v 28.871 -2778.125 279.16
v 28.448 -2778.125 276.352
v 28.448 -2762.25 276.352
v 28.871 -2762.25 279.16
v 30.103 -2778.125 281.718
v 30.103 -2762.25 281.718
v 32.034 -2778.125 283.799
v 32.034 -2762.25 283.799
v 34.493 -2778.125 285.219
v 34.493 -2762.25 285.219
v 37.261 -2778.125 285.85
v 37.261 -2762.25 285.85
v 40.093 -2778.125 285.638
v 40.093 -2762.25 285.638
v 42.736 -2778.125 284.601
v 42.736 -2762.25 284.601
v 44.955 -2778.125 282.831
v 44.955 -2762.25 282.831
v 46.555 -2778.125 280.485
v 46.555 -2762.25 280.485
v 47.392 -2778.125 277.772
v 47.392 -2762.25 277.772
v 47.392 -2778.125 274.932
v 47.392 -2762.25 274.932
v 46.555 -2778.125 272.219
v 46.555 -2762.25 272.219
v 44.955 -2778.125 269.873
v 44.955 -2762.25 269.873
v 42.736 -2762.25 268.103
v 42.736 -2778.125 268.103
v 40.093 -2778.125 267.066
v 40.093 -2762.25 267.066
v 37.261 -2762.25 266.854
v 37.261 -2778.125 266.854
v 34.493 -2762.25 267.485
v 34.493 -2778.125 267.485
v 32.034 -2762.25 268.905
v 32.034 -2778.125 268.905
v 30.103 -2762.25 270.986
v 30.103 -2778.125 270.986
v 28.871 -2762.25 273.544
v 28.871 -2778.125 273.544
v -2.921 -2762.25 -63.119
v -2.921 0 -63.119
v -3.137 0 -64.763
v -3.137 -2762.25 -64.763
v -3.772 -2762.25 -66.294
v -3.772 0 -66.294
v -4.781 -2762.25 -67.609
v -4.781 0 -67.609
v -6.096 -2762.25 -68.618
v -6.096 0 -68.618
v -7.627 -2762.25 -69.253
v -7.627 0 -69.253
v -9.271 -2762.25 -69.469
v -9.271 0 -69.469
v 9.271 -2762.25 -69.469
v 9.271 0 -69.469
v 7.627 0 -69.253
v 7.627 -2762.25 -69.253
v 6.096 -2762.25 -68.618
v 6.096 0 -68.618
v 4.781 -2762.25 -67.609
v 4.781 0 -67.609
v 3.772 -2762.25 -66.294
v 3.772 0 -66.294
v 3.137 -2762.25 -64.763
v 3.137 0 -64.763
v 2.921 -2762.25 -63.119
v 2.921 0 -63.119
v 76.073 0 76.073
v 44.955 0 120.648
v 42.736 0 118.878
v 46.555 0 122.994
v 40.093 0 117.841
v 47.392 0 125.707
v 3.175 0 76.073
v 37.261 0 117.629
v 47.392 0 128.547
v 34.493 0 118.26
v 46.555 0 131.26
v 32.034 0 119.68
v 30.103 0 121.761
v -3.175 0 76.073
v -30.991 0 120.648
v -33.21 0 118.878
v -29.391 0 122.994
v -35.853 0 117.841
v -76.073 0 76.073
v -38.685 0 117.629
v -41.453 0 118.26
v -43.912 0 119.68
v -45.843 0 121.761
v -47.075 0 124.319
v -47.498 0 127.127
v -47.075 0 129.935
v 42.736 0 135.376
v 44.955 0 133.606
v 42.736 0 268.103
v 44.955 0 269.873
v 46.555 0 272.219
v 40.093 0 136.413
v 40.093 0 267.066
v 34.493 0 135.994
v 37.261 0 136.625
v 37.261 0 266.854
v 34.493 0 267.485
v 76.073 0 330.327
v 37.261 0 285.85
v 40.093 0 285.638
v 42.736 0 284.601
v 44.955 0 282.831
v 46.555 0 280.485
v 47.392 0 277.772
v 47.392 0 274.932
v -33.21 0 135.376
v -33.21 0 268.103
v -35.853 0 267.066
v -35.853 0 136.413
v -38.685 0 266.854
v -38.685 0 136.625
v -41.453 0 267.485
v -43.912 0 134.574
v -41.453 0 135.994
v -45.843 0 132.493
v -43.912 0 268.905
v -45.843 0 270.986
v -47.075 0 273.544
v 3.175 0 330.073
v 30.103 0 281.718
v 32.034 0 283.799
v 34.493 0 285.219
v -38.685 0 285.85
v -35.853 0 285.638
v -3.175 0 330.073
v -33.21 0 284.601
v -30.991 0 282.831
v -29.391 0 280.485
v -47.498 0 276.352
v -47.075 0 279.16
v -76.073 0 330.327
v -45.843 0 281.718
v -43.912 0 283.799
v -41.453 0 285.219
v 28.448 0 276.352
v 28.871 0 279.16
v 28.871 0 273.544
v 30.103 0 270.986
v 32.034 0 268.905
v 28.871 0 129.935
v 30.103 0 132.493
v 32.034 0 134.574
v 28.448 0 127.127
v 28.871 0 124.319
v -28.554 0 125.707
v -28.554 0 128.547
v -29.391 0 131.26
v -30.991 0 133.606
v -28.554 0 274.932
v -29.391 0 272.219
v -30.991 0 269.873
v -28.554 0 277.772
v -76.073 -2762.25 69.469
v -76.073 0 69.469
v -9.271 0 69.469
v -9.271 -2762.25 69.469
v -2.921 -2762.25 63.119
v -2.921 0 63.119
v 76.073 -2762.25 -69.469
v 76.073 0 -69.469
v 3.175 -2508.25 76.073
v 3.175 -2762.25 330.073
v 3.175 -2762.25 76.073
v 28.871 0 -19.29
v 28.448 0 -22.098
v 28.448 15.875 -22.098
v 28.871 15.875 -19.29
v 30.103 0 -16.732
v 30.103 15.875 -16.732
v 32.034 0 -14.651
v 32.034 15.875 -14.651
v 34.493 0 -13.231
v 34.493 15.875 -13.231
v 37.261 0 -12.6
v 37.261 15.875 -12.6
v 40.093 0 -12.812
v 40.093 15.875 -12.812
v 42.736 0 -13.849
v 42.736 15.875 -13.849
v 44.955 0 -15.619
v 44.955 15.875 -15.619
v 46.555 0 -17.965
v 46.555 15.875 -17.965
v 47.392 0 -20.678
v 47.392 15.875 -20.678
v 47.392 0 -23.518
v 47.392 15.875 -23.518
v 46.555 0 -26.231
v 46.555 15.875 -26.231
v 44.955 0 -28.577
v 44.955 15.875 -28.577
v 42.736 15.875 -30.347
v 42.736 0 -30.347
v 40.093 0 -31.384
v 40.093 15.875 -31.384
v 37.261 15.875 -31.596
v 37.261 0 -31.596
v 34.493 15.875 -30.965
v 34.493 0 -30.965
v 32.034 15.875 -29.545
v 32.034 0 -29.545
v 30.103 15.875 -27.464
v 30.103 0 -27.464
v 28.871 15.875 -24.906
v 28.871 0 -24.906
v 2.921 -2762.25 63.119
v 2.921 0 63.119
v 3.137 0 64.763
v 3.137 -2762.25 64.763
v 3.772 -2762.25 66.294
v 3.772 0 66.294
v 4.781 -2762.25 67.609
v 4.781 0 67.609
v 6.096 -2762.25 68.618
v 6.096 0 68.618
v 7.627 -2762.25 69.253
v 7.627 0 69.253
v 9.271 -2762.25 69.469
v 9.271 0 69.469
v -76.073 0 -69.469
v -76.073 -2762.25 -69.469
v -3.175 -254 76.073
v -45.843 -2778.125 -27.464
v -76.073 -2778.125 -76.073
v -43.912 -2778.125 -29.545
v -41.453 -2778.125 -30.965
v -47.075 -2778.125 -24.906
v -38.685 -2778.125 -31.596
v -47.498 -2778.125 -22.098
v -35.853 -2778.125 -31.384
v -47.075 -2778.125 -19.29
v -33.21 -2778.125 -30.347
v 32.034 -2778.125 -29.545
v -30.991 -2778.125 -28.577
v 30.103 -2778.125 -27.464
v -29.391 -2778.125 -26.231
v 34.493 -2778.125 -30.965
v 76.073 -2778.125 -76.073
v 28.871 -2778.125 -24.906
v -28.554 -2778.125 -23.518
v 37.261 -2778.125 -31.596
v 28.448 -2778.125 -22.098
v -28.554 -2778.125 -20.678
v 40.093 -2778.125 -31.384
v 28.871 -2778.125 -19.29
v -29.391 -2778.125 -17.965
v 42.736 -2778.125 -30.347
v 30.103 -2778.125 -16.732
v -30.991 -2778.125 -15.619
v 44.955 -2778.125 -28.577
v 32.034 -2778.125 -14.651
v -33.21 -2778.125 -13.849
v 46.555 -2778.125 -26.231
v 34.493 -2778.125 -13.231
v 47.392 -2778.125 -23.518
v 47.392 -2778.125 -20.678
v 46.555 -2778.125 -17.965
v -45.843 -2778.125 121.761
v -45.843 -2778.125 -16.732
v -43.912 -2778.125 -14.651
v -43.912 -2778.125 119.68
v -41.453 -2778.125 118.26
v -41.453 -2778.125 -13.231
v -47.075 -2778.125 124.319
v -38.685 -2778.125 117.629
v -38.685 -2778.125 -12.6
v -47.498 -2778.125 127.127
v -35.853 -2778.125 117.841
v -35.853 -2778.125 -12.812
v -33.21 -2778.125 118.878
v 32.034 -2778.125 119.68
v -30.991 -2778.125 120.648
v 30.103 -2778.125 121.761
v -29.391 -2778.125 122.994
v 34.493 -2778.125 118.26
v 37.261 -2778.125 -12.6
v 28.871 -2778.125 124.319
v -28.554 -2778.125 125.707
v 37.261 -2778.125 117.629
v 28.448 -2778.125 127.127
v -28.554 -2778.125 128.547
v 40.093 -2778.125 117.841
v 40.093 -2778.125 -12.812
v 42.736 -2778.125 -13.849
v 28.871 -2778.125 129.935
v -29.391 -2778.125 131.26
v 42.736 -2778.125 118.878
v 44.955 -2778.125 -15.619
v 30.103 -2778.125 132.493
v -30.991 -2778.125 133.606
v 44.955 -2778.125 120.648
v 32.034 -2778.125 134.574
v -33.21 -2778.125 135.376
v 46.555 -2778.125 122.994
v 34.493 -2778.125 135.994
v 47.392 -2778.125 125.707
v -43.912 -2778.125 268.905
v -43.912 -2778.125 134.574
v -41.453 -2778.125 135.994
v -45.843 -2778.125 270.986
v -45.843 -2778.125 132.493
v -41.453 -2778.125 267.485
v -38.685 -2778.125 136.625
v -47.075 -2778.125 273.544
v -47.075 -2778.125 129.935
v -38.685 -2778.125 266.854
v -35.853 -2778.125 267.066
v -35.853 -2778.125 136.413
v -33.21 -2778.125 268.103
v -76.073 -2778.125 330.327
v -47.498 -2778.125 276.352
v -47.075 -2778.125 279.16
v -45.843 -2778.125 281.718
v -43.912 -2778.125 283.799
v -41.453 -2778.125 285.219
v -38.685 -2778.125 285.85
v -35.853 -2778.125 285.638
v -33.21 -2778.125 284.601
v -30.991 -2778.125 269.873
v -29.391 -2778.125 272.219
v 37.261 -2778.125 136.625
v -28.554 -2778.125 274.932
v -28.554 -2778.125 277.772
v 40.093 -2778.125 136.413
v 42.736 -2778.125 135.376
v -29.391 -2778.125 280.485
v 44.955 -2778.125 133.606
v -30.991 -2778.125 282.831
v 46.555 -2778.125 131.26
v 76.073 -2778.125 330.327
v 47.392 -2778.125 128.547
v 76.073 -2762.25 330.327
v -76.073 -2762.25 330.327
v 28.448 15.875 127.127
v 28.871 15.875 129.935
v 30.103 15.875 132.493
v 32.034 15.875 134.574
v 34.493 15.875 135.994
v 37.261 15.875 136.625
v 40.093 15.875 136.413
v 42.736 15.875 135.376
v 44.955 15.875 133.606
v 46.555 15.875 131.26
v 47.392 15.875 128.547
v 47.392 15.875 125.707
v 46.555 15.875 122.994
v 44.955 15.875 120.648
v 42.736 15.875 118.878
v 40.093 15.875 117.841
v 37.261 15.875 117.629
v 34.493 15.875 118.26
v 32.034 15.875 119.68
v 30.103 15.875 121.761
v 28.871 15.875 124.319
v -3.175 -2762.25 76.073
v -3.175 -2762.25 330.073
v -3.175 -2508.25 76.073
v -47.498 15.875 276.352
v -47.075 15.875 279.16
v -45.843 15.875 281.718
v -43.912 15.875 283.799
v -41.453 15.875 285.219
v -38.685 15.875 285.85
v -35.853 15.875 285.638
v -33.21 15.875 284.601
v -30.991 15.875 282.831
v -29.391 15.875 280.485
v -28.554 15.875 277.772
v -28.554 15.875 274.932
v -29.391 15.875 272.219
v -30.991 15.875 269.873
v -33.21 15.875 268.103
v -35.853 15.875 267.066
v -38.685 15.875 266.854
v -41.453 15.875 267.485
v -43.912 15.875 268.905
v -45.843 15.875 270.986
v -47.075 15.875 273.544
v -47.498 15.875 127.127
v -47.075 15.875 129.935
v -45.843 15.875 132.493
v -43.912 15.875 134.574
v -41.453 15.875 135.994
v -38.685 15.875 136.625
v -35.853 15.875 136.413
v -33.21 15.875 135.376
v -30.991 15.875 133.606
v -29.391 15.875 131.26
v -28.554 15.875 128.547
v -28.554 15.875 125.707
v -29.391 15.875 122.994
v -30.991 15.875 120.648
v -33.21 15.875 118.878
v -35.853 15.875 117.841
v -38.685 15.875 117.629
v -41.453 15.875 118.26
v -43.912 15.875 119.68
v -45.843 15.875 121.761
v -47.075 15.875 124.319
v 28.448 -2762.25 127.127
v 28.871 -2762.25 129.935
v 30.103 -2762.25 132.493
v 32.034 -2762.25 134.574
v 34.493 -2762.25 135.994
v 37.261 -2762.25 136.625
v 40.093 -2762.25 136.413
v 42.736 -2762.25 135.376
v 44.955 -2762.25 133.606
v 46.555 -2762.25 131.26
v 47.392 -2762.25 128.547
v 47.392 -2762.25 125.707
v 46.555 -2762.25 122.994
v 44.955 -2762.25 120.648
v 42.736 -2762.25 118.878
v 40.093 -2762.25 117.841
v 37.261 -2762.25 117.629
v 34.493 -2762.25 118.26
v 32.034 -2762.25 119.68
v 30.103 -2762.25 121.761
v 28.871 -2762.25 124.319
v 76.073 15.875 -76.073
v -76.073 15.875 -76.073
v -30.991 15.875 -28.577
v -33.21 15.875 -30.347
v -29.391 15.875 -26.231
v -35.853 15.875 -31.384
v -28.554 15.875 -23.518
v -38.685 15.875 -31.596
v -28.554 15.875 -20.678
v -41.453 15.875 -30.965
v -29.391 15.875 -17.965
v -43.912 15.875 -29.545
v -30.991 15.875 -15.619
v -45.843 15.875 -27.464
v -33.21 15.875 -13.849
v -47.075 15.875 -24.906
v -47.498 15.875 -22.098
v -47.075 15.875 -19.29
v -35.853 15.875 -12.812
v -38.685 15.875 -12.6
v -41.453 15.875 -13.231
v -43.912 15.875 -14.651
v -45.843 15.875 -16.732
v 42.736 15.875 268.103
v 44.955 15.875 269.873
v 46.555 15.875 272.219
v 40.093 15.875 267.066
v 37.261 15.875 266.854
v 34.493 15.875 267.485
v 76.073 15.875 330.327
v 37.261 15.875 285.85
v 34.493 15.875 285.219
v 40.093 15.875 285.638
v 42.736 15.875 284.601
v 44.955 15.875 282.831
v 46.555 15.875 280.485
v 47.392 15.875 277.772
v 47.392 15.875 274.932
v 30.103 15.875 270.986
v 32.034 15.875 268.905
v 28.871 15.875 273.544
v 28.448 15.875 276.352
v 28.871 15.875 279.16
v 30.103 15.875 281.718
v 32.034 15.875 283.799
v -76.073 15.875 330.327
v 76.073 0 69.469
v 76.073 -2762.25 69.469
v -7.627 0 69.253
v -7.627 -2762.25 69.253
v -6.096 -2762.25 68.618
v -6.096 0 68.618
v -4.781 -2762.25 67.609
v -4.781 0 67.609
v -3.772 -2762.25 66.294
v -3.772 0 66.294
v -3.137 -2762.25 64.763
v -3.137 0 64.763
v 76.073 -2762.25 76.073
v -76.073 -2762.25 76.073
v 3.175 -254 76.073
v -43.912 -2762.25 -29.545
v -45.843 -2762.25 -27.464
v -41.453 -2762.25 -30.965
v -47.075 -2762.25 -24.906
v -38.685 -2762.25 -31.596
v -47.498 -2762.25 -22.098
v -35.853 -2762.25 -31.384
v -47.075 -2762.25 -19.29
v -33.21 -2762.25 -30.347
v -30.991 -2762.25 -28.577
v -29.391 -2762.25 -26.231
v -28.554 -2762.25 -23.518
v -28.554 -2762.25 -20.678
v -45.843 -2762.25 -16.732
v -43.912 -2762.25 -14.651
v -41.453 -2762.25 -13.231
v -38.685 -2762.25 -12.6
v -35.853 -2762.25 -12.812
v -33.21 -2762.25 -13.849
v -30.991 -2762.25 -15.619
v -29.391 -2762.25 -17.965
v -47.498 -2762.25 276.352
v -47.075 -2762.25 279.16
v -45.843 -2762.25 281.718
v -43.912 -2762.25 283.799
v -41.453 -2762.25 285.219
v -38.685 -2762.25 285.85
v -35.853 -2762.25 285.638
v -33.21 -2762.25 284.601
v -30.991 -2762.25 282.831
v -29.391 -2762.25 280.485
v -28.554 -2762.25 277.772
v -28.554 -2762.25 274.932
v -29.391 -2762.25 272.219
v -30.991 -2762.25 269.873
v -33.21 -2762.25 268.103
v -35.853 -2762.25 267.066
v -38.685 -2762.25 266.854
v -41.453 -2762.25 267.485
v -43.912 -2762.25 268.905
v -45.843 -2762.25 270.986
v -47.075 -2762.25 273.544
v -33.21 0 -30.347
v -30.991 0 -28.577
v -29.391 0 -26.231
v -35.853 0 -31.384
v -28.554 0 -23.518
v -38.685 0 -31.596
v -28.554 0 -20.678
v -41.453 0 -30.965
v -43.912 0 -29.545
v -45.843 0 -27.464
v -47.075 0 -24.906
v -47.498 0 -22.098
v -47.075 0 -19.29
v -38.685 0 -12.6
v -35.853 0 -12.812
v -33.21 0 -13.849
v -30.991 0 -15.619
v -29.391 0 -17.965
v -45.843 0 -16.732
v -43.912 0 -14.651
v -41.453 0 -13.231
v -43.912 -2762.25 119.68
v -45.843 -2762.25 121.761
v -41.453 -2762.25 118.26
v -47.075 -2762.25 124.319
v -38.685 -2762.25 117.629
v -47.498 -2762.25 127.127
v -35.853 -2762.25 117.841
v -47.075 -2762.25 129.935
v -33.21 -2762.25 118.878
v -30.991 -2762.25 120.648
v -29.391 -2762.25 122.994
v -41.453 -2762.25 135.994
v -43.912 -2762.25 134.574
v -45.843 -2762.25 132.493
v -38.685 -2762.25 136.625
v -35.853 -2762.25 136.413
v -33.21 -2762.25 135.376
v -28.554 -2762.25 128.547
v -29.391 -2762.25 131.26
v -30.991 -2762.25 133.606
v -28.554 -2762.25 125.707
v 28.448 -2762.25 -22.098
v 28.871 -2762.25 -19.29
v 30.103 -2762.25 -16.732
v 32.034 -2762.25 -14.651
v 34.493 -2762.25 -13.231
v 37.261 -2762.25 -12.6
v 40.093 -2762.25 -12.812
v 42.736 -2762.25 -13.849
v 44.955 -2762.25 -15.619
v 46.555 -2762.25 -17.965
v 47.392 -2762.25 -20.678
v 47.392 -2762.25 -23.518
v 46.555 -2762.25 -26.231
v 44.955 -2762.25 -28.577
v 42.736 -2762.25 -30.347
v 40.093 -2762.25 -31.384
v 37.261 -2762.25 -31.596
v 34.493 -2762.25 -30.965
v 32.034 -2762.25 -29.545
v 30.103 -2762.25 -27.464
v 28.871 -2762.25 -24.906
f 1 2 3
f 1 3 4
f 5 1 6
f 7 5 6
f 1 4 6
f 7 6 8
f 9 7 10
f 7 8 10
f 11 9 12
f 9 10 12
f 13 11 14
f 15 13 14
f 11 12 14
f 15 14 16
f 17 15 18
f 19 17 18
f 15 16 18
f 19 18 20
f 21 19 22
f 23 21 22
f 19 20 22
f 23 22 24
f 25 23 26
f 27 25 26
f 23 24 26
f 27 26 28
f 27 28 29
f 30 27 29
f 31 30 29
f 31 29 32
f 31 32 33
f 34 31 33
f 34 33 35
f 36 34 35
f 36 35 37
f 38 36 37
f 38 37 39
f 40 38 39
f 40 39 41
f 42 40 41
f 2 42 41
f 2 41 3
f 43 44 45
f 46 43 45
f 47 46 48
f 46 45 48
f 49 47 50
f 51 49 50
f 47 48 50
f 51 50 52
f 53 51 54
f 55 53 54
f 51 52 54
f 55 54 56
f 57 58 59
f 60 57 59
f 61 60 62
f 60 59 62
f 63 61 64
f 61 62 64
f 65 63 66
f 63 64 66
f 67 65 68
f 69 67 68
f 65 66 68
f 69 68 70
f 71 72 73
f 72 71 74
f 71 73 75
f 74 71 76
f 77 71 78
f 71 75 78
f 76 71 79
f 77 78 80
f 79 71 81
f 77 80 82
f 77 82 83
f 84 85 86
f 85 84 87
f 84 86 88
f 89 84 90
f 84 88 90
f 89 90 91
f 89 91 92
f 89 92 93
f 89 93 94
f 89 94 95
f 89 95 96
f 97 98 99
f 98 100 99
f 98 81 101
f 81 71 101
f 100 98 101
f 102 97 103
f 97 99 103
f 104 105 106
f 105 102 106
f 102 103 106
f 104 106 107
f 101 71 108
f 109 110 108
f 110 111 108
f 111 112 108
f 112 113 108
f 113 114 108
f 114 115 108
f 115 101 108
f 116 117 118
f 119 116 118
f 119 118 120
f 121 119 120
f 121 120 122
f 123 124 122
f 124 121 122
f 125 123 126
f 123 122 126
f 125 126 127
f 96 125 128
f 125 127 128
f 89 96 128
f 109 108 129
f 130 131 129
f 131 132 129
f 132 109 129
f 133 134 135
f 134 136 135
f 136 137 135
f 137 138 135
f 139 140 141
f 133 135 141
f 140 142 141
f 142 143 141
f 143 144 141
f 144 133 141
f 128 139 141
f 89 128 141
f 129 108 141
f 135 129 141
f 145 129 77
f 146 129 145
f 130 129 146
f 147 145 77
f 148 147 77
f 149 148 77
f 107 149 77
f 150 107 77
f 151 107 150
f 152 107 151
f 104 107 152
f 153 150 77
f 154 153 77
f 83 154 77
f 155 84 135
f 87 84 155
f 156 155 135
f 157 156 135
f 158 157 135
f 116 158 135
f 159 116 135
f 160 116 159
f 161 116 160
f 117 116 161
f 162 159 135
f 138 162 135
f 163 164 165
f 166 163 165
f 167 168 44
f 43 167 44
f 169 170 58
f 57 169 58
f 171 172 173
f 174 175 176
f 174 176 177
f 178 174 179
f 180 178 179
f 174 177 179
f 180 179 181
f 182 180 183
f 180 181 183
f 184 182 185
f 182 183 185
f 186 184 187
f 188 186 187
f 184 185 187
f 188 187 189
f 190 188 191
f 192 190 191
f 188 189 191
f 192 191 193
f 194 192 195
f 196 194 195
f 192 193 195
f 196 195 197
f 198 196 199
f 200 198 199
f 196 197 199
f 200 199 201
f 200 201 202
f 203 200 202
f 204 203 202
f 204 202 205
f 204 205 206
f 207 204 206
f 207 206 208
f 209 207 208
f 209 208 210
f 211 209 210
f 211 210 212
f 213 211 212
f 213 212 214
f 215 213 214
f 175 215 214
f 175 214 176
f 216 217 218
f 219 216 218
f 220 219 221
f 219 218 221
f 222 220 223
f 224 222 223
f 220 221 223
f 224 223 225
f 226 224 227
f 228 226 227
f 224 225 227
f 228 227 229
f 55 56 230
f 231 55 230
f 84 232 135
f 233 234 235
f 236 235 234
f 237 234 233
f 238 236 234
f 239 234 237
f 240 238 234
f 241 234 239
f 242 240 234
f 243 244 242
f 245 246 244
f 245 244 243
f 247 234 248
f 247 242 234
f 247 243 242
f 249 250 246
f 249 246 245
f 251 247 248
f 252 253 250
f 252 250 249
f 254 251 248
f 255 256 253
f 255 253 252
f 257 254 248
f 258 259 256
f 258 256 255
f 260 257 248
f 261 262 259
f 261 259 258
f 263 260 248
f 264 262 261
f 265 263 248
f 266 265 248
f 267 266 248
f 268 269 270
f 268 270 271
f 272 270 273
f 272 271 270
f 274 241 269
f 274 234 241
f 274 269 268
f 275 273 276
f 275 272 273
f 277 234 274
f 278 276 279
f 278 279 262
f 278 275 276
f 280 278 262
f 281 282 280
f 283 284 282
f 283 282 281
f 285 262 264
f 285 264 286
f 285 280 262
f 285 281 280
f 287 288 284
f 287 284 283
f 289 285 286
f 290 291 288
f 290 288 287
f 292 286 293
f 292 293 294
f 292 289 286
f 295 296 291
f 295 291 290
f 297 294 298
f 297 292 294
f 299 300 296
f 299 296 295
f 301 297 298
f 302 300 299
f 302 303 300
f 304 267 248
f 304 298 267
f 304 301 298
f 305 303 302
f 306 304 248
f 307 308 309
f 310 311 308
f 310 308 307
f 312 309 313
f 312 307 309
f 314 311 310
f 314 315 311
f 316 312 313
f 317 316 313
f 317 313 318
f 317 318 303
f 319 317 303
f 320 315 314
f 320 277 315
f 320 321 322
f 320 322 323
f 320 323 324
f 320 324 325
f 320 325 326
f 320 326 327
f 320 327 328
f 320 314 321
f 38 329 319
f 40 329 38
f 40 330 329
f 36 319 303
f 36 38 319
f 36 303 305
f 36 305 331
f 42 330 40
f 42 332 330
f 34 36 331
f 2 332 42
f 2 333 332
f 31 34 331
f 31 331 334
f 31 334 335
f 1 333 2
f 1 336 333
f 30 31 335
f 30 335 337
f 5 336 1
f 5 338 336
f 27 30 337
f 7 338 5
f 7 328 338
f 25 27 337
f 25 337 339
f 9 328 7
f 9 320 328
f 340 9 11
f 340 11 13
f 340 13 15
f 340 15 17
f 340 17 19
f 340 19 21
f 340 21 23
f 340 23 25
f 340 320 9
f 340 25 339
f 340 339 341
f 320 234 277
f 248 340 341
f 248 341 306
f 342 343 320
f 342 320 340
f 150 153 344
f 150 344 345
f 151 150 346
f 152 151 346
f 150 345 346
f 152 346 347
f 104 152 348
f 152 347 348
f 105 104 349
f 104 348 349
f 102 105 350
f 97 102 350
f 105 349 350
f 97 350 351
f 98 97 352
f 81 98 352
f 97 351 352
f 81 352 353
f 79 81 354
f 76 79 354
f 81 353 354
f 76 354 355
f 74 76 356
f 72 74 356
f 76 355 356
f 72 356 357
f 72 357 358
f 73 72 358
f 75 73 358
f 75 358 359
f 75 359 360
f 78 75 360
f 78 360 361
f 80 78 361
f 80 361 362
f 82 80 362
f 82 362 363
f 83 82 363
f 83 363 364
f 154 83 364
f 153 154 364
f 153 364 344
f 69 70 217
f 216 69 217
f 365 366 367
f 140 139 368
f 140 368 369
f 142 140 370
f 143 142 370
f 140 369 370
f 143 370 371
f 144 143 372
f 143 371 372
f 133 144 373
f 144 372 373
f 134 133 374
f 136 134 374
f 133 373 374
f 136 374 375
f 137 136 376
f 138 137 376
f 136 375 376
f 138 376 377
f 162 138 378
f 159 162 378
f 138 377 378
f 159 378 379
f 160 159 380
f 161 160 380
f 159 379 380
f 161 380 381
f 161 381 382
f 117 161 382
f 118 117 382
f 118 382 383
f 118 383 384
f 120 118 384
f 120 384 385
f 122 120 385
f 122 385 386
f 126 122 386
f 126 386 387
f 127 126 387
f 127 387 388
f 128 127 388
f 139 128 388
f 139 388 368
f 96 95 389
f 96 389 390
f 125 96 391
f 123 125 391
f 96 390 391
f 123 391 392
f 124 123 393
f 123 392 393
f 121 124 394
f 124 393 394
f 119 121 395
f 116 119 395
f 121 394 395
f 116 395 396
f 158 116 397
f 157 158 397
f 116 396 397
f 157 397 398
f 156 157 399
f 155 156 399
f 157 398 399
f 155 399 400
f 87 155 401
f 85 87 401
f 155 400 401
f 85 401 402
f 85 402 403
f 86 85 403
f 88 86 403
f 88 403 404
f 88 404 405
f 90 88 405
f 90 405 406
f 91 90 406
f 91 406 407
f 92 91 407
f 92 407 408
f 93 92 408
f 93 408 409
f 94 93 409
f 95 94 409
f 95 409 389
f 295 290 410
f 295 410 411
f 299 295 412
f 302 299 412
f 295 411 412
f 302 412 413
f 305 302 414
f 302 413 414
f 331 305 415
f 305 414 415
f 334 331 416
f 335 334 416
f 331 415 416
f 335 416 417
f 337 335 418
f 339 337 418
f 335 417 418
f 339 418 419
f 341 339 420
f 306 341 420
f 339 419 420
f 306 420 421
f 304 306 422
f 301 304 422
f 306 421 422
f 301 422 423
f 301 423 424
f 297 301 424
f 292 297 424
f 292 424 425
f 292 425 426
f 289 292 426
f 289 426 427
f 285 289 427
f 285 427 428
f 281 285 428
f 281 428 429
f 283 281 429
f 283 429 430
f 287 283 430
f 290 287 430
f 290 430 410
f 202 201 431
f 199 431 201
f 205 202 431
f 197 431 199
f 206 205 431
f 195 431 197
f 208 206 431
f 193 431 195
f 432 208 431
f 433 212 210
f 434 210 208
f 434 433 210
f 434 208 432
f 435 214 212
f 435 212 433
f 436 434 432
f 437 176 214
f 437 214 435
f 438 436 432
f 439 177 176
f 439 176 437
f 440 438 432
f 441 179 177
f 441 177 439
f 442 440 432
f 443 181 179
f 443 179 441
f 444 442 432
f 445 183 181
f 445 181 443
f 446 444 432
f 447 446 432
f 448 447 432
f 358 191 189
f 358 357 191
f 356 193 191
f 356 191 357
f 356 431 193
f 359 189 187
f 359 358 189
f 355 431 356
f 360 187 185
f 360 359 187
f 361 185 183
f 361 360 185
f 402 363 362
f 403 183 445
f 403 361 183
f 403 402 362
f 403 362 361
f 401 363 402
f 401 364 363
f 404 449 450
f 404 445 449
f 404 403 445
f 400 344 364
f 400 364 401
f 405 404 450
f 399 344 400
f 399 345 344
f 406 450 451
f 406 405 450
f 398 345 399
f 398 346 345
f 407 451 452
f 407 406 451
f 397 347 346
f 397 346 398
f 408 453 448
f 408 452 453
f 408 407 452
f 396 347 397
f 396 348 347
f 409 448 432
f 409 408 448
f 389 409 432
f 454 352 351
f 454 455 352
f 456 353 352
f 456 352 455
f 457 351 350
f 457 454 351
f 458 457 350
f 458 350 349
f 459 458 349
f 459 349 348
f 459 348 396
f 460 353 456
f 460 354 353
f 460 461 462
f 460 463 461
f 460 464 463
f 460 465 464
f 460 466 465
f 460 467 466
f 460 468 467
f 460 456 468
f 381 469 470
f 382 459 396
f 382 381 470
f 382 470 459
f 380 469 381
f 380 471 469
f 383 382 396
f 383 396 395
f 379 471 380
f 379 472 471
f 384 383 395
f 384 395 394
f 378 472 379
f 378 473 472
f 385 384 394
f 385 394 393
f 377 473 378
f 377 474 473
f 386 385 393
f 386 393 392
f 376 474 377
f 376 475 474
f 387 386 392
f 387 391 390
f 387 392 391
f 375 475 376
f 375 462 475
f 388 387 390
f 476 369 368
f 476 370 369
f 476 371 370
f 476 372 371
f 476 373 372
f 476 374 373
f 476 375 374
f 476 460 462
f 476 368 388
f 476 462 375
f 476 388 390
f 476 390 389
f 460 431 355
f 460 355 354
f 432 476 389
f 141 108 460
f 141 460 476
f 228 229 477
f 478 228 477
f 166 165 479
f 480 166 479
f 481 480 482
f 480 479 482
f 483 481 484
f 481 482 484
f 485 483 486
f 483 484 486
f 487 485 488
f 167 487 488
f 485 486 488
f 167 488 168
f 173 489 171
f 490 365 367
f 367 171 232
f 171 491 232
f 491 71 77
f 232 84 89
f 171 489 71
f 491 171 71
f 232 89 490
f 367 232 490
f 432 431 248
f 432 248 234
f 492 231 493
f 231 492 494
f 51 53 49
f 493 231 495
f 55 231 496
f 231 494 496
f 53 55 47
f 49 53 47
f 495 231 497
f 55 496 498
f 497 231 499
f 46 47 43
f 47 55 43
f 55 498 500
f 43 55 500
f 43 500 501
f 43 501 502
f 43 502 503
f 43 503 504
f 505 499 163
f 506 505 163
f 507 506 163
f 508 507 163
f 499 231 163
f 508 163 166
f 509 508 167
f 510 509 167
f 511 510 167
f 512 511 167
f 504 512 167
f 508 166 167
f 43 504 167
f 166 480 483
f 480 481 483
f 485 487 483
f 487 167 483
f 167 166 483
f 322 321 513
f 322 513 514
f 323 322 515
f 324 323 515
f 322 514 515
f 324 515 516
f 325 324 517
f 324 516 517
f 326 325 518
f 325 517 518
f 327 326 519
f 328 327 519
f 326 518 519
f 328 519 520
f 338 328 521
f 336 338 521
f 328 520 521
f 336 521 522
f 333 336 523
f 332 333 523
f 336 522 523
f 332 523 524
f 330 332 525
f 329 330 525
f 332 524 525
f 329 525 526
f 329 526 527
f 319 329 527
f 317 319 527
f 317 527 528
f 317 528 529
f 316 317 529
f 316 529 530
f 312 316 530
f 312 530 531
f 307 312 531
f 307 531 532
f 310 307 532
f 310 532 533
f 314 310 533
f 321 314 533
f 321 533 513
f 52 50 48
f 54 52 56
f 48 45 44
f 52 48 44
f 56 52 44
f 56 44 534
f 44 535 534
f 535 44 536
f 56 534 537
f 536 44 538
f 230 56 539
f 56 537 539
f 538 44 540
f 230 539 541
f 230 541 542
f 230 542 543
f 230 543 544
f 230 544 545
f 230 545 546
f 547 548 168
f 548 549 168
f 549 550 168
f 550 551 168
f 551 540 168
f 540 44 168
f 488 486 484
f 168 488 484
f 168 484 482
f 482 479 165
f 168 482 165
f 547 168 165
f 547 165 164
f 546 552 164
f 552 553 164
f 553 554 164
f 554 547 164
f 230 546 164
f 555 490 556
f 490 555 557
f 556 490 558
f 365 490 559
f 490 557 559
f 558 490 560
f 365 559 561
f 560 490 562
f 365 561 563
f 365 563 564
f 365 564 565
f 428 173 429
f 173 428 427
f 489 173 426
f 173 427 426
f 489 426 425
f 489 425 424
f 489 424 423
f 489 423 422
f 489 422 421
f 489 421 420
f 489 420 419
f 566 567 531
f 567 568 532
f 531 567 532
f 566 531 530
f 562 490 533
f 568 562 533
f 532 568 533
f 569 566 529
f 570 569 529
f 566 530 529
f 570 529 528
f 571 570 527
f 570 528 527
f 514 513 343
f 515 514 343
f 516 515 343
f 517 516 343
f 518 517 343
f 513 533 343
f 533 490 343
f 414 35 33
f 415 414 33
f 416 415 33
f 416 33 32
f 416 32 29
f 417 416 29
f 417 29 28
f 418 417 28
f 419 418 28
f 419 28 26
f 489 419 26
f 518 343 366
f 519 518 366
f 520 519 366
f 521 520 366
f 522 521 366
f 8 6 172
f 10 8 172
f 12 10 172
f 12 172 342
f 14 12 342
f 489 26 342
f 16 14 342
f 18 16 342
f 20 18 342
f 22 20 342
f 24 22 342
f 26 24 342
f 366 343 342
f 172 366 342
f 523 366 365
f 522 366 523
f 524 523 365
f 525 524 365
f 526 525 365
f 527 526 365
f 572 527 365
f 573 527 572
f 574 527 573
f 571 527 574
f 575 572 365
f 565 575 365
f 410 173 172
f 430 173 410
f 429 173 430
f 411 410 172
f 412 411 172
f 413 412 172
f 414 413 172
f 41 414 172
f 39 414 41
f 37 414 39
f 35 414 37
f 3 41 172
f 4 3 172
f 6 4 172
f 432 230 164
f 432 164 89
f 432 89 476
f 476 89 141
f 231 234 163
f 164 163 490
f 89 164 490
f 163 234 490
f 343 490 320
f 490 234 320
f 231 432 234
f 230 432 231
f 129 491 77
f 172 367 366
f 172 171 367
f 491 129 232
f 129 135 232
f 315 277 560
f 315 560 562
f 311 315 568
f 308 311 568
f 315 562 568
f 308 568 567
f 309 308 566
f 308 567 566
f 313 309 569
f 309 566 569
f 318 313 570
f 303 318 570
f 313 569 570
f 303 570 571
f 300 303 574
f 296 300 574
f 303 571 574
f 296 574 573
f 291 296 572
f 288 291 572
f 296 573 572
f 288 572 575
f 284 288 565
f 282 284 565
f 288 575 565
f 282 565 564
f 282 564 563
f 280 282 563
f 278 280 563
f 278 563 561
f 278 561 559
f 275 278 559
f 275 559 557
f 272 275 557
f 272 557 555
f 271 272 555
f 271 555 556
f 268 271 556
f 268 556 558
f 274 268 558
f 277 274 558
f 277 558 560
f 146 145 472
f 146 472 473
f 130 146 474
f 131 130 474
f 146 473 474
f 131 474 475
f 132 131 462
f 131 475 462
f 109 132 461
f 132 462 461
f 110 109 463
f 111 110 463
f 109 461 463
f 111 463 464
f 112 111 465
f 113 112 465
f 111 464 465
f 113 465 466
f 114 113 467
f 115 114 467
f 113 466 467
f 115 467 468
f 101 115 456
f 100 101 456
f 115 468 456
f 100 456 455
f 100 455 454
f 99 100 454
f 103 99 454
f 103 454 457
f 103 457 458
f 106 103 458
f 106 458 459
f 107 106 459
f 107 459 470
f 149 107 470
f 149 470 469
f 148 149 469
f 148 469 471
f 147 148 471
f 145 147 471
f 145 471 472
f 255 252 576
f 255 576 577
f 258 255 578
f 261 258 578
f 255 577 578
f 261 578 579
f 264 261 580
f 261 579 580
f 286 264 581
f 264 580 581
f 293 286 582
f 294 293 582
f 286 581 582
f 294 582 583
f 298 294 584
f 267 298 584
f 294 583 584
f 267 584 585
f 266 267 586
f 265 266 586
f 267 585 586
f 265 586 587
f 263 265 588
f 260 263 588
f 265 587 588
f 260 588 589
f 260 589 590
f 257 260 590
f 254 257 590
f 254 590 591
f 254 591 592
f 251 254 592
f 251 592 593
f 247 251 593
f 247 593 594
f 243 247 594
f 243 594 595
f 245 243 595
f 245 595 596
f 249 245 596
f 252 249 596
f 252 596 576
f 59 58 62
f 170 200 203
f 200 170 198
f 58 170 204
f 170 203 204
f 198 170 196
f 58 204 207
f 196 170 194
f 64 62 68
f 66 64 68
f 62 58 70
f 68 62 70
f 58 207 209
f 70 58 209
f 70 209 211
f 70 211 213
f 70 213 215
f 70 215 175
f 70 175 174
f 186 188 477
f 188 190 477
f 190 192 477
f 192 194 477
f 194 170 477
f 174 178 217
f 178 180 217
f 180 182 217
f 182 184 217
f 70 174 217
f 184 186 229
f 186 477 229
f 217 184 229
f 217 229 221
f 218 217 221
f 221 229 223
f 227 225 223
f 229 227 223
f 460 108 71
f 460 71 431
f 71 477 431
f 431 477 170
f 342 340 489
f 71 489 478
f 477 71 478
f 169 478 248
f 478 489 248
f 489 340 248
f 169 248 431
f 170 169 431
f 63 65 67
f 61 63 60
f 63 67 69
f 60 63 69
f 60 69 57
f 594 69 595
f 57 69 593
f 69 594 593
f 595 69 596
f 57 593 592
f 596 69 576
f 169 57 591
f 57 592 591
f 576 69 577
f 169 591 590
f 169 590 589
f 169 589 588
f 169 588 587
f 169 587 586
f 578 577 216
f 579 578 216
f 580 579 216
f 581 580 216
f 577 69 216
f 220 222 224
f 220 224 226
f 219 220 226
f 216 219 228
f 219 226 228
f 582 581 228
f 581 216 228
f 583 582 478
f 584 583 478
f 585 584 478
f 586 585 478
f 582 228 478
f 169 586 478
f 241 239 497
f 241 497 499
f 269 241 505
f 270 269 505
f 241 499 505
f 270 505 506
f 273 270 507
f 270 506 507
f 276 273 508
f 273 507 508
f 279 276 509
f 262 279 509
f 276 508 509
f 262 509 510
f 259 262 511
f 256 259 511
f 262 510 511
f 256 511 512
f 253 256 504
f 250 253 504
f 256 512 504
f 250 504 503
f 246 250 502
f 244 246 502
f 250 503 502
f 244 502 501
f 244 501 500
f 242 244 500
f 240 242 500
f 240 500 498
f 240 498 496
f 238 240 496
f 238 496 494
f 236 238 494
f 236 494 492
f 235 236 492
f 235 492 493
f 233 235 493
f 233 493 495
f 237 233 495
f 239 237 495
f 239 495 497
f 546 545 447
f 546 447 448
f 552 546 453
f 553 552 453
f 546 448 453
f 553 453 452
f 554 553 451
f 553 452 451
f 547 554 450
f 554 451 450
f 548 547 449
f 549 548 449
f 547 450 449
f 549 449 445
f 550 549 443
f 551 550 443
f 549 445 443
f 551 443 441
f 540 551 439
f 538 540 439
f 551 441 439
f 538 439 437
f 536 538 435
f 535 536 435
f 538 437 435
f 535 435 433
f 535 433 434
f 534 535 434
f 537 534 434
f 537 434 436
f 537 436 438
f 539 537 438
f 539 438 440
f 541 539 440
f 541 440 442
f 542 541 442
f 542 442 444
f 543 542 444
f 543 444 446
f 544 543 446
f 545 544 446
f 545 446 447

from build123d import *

# Parameters (mm, degrees)
F1_DEPTH = 2762.25
F2_W     = 152.146
F2_H     = 254.254
F3_DEPTH = 15.875
F4_W     = 152.146
F4_H     = 254.254
F5_DEPTH = 15.875
F7_DEPTH = 3.175
F8_R     = 9.525
F9_DEPTH = 2794


with BuildPart() as f1:
    # F0 (on Front) → F1 (new body)
    with BuildSketch(Plane.XZ):
        with BuildLine():
            Line((76.073, 76.073), (-76.073, 76.073))
            Line((-76.073, 76.073), (-76.073, 69.469))
            Line((-76.073, 69.469), (-9.271, 69.469))
            ThreePointArc((-9.271, 69.469), (-4.7808719395, 67.6091280605), (-2.921, 63.119))
            Line((-2.921, 63.119), (-2.921, -63.119))
            ThreePointArc((-2.921, -63.119), (-4.7808719395, -67.6091280605), (-9.271, -69.469))
            Line((-9.271, -69.469), (-76.073, -69.469))
            Line((-76.073, -69.469), (-76.073, -76.073))
            Line((-76.073, -76.073), (76.073, -76.073))
            Line((76.073, -76.073), (76.073, -69.469))
            Line((76.073, -69.469), (9.271, -69.469))
            ThreePointArc((9.271, -69.469), (4.7808719395, -67.6091280605), (2.921, -63.119))
            Line((2.921, -63.119), (2.921, 63.119))
            ThreePointArc((2.921, 63.119), (4.7808719395, 67.6091280605), (9.271, 69.469))
            Line((9.271, 69.469), (76.073, 69.469))
            Line((76.073, 69.469), (76.073, 76.073))
        make_face()
    extrude(amount=F1_DEPTH)

    # F2 (on face) → F3 (join)
    with BuildSketch(Plane.XZ.offset(2762.25)):
        with BuildLine():
            Line((9.271, -69.469), (76.073, -69.469))
            Line((76.073, -69.469), (76.073, 69.469))
            Line((76.073, 69.469), (9.271, 69.469))
            ThreePointArc((9.271, 69.469), (4.7808719395, 67.6091280605), (2.921, 63.119))
            Line((2.921, 63.119), (2.921, -63.119))
            ThreePointArc((2.921, -63.119), (4.7808719395, -67.6091280605), (9.271, -69.469))
        make_face()
        with BuildLine():
            Line((-76.073, 69.469), (-76.073, -69.469))
            Line((-76.073, -69.469), (-9.271, -69.469))
            ThreePointArc((-9.271, -69.469), (-4.7808719395, -67.6091280605), (-2.921, -63.119))
            Line((-2.921, -63.119), (-2.921, 63.119))
            ThreePointArc((-2.921, 63.119), (-4.7808719395, 67.6091280605), (-9.271, 69.469))
            Line((-9.271, 69.469), (-76.073, 69.469))
        make_face()
        with Locations((0, 203.2)):
            Rectangle(F2_W, F2_H)
        with BuildLine():
            Line((-76.073, -69.469), (-76.073, -76.073))
            Line((-76.073, -76.073), (76.073, -76.073))
            Line((76.073, -76.073), (76.073, -69.469))
            Line((76.073, -69.469), (9.271, -69.469))
            ThreePointArc((9.271, -69.469), (4.7808719395, -67.6091280605), (2.921, -63.119))
            Line((2.921, -63.119), (2.921, 63.119))
            ThreePointArc((2.921, 63.119), (4.7808719395, 67.6091280605), (9.271, 69.469))
            Line((9.271, 69.469), (76.073, 69.469))
            Line((76.073, 69.469), (76.073, 76.073))
            Line((76.073, 76.073), (-76.073, 76.073))
            Line((-76.073, 76.073), (-76.073, 69.469))
            Line((-76.073, 69.469), (-9.271, 69.469))
            ThreePointArc((-9.271, 69.469), (-4.7808719395, 67.6091280605), (-2.921, 63.119))
            Line((-2.921, 63.119), (-2.921, -63.119))
            ThreePointArc((-2.921, -63.119), (-4.7808719395, -67.6091280605), (-9.271, -69.469))
            Line((-9.271, -69.469), (-76.073, -69.469))
        make_face()
    extrude(amount=F3_DEPTH)

    # F4 (on face) → F5 (join)
    with BuildSketch(Plane(origin=(0, 0, 0), x_dir=(-1, 0, 0), z_dir=(0, 1, 0))):
        with Locations((0, 203.2)):
            Rectangle(F4_W, F4_H)
        with BuildLine():
            Line((-76.073, -76.073), (76.073, -76.073))
            Line((76.073, -76.073), (76.073, -69.469))
            Line((76.073, -69.469), (9.271, -69.469))
            ThreePointArc((9.271, -69.469), (4.7808719395, -67.6091280605), (2.921, -63.119))
            Line((2.921, -63.119), (2.921, 63.119))
            ThreePointArc((2.921, 63.119), (4.7808719395, 67.6091280605), (9.271, 69.469))
            Line((9.271, 69.469), (76.073, 69.469))
            Line((76.073, 69.469), (76.073, 76.073))
            Line((76.073, 76.073), (-76.073, 76.073))
            Line((-76.073, 76.073), (-76.073, 69.469))
            Line((-76.073, 69.469), (-9.271, 69.469))
            ThreePointArc((-9.271, 69.469), (-4.7808719395, 67.6091280605), (-2.921, 63.119))
            Line((-2.921, 63.119), (-2.921, -63.119))
            ThreePointArc((-2.921, -63.119), (-4.7808719395, -67.6091280605), (-9.271, -69.469))
            Line((-9.271, -69.469), (-76.073, -69.469))
            Line((-76.073, -69.469), (-76.073, -76.073))
        make_face()
        with BuildLine():
            Line((9.271, -69.469), (76.073, -69.469))
            Line((76.073, -69.469), (76.073, 69.469))
            Line((76.073, 69.469), (9.271, 69.469))
            ThreePointArc((9.271, 69.469), (4.7808719395, 67.6091280605), (2.921, 63.119))
            Line((2.921, 63.119), (2.921, -63.119))
            ThreePointArc((2.921, -63.119), (4.7808719395, -67.6091280605), (9.271, -69.469))
        make_face()
        with BuildLine():
            Line((-76.073, 69.469), (-76.073, -69.469))
            Line((-76.073, -69.469), (-9.271, -69.469))
            ThreePointArc((-9.271, -69.469), (-4.7808719395, -67.6091280605), (-2.921, -63.119))
            Line((-2.921, -63.119), (-2.921, 63.119))
            ThreePointArc((-2.921, 63.119), (-4.7808719395, 67.6091280605), (-9.271, 69.469))
            Line((-9.271, 69.469), (-76.073, 69.469))
        make_face()
    extrude(amount=F5_DEPTH)

    # F6 (on Right) → F7 (join, symmetric)
    with BuildSketch(Plane.YZ):
        Polygon((0, 76.073), (0, 330.073), (-254, 76.073), align=None)
        Polygon((-2762.25, 330.073), (-2762.25, 76.073), (-2508.25, 76.073), align=None)
    extrude(amount=F7_DEPTH, both=True)

    # F8 (on face) → F9 (cut)
    with BuildSketch(Plane(origin=(0, 15.875, 0), x_dir=(-1, 0, 0), z_dir=(0, 1, 0))):
        with Locations((-37.973, 276.352)):
            Circle(F8_R)
        with Locations((37.973, 127.127)):
            Circle(F8_R)
        with Locations((-37.973, 127.127)):
            Circle(F8_R)
        with Locations((-37.973, -22.098)):
            Circle(F8_R)
        with Locations((37.973, -22.098)):
            Circle(F8_R)
        with Locations((37.973, 276.352)):
            Circle(F8_R)
    extrude(amount=-F9_DEPTH, mode=Mode.SUBTRACT)


solid = f1.part
